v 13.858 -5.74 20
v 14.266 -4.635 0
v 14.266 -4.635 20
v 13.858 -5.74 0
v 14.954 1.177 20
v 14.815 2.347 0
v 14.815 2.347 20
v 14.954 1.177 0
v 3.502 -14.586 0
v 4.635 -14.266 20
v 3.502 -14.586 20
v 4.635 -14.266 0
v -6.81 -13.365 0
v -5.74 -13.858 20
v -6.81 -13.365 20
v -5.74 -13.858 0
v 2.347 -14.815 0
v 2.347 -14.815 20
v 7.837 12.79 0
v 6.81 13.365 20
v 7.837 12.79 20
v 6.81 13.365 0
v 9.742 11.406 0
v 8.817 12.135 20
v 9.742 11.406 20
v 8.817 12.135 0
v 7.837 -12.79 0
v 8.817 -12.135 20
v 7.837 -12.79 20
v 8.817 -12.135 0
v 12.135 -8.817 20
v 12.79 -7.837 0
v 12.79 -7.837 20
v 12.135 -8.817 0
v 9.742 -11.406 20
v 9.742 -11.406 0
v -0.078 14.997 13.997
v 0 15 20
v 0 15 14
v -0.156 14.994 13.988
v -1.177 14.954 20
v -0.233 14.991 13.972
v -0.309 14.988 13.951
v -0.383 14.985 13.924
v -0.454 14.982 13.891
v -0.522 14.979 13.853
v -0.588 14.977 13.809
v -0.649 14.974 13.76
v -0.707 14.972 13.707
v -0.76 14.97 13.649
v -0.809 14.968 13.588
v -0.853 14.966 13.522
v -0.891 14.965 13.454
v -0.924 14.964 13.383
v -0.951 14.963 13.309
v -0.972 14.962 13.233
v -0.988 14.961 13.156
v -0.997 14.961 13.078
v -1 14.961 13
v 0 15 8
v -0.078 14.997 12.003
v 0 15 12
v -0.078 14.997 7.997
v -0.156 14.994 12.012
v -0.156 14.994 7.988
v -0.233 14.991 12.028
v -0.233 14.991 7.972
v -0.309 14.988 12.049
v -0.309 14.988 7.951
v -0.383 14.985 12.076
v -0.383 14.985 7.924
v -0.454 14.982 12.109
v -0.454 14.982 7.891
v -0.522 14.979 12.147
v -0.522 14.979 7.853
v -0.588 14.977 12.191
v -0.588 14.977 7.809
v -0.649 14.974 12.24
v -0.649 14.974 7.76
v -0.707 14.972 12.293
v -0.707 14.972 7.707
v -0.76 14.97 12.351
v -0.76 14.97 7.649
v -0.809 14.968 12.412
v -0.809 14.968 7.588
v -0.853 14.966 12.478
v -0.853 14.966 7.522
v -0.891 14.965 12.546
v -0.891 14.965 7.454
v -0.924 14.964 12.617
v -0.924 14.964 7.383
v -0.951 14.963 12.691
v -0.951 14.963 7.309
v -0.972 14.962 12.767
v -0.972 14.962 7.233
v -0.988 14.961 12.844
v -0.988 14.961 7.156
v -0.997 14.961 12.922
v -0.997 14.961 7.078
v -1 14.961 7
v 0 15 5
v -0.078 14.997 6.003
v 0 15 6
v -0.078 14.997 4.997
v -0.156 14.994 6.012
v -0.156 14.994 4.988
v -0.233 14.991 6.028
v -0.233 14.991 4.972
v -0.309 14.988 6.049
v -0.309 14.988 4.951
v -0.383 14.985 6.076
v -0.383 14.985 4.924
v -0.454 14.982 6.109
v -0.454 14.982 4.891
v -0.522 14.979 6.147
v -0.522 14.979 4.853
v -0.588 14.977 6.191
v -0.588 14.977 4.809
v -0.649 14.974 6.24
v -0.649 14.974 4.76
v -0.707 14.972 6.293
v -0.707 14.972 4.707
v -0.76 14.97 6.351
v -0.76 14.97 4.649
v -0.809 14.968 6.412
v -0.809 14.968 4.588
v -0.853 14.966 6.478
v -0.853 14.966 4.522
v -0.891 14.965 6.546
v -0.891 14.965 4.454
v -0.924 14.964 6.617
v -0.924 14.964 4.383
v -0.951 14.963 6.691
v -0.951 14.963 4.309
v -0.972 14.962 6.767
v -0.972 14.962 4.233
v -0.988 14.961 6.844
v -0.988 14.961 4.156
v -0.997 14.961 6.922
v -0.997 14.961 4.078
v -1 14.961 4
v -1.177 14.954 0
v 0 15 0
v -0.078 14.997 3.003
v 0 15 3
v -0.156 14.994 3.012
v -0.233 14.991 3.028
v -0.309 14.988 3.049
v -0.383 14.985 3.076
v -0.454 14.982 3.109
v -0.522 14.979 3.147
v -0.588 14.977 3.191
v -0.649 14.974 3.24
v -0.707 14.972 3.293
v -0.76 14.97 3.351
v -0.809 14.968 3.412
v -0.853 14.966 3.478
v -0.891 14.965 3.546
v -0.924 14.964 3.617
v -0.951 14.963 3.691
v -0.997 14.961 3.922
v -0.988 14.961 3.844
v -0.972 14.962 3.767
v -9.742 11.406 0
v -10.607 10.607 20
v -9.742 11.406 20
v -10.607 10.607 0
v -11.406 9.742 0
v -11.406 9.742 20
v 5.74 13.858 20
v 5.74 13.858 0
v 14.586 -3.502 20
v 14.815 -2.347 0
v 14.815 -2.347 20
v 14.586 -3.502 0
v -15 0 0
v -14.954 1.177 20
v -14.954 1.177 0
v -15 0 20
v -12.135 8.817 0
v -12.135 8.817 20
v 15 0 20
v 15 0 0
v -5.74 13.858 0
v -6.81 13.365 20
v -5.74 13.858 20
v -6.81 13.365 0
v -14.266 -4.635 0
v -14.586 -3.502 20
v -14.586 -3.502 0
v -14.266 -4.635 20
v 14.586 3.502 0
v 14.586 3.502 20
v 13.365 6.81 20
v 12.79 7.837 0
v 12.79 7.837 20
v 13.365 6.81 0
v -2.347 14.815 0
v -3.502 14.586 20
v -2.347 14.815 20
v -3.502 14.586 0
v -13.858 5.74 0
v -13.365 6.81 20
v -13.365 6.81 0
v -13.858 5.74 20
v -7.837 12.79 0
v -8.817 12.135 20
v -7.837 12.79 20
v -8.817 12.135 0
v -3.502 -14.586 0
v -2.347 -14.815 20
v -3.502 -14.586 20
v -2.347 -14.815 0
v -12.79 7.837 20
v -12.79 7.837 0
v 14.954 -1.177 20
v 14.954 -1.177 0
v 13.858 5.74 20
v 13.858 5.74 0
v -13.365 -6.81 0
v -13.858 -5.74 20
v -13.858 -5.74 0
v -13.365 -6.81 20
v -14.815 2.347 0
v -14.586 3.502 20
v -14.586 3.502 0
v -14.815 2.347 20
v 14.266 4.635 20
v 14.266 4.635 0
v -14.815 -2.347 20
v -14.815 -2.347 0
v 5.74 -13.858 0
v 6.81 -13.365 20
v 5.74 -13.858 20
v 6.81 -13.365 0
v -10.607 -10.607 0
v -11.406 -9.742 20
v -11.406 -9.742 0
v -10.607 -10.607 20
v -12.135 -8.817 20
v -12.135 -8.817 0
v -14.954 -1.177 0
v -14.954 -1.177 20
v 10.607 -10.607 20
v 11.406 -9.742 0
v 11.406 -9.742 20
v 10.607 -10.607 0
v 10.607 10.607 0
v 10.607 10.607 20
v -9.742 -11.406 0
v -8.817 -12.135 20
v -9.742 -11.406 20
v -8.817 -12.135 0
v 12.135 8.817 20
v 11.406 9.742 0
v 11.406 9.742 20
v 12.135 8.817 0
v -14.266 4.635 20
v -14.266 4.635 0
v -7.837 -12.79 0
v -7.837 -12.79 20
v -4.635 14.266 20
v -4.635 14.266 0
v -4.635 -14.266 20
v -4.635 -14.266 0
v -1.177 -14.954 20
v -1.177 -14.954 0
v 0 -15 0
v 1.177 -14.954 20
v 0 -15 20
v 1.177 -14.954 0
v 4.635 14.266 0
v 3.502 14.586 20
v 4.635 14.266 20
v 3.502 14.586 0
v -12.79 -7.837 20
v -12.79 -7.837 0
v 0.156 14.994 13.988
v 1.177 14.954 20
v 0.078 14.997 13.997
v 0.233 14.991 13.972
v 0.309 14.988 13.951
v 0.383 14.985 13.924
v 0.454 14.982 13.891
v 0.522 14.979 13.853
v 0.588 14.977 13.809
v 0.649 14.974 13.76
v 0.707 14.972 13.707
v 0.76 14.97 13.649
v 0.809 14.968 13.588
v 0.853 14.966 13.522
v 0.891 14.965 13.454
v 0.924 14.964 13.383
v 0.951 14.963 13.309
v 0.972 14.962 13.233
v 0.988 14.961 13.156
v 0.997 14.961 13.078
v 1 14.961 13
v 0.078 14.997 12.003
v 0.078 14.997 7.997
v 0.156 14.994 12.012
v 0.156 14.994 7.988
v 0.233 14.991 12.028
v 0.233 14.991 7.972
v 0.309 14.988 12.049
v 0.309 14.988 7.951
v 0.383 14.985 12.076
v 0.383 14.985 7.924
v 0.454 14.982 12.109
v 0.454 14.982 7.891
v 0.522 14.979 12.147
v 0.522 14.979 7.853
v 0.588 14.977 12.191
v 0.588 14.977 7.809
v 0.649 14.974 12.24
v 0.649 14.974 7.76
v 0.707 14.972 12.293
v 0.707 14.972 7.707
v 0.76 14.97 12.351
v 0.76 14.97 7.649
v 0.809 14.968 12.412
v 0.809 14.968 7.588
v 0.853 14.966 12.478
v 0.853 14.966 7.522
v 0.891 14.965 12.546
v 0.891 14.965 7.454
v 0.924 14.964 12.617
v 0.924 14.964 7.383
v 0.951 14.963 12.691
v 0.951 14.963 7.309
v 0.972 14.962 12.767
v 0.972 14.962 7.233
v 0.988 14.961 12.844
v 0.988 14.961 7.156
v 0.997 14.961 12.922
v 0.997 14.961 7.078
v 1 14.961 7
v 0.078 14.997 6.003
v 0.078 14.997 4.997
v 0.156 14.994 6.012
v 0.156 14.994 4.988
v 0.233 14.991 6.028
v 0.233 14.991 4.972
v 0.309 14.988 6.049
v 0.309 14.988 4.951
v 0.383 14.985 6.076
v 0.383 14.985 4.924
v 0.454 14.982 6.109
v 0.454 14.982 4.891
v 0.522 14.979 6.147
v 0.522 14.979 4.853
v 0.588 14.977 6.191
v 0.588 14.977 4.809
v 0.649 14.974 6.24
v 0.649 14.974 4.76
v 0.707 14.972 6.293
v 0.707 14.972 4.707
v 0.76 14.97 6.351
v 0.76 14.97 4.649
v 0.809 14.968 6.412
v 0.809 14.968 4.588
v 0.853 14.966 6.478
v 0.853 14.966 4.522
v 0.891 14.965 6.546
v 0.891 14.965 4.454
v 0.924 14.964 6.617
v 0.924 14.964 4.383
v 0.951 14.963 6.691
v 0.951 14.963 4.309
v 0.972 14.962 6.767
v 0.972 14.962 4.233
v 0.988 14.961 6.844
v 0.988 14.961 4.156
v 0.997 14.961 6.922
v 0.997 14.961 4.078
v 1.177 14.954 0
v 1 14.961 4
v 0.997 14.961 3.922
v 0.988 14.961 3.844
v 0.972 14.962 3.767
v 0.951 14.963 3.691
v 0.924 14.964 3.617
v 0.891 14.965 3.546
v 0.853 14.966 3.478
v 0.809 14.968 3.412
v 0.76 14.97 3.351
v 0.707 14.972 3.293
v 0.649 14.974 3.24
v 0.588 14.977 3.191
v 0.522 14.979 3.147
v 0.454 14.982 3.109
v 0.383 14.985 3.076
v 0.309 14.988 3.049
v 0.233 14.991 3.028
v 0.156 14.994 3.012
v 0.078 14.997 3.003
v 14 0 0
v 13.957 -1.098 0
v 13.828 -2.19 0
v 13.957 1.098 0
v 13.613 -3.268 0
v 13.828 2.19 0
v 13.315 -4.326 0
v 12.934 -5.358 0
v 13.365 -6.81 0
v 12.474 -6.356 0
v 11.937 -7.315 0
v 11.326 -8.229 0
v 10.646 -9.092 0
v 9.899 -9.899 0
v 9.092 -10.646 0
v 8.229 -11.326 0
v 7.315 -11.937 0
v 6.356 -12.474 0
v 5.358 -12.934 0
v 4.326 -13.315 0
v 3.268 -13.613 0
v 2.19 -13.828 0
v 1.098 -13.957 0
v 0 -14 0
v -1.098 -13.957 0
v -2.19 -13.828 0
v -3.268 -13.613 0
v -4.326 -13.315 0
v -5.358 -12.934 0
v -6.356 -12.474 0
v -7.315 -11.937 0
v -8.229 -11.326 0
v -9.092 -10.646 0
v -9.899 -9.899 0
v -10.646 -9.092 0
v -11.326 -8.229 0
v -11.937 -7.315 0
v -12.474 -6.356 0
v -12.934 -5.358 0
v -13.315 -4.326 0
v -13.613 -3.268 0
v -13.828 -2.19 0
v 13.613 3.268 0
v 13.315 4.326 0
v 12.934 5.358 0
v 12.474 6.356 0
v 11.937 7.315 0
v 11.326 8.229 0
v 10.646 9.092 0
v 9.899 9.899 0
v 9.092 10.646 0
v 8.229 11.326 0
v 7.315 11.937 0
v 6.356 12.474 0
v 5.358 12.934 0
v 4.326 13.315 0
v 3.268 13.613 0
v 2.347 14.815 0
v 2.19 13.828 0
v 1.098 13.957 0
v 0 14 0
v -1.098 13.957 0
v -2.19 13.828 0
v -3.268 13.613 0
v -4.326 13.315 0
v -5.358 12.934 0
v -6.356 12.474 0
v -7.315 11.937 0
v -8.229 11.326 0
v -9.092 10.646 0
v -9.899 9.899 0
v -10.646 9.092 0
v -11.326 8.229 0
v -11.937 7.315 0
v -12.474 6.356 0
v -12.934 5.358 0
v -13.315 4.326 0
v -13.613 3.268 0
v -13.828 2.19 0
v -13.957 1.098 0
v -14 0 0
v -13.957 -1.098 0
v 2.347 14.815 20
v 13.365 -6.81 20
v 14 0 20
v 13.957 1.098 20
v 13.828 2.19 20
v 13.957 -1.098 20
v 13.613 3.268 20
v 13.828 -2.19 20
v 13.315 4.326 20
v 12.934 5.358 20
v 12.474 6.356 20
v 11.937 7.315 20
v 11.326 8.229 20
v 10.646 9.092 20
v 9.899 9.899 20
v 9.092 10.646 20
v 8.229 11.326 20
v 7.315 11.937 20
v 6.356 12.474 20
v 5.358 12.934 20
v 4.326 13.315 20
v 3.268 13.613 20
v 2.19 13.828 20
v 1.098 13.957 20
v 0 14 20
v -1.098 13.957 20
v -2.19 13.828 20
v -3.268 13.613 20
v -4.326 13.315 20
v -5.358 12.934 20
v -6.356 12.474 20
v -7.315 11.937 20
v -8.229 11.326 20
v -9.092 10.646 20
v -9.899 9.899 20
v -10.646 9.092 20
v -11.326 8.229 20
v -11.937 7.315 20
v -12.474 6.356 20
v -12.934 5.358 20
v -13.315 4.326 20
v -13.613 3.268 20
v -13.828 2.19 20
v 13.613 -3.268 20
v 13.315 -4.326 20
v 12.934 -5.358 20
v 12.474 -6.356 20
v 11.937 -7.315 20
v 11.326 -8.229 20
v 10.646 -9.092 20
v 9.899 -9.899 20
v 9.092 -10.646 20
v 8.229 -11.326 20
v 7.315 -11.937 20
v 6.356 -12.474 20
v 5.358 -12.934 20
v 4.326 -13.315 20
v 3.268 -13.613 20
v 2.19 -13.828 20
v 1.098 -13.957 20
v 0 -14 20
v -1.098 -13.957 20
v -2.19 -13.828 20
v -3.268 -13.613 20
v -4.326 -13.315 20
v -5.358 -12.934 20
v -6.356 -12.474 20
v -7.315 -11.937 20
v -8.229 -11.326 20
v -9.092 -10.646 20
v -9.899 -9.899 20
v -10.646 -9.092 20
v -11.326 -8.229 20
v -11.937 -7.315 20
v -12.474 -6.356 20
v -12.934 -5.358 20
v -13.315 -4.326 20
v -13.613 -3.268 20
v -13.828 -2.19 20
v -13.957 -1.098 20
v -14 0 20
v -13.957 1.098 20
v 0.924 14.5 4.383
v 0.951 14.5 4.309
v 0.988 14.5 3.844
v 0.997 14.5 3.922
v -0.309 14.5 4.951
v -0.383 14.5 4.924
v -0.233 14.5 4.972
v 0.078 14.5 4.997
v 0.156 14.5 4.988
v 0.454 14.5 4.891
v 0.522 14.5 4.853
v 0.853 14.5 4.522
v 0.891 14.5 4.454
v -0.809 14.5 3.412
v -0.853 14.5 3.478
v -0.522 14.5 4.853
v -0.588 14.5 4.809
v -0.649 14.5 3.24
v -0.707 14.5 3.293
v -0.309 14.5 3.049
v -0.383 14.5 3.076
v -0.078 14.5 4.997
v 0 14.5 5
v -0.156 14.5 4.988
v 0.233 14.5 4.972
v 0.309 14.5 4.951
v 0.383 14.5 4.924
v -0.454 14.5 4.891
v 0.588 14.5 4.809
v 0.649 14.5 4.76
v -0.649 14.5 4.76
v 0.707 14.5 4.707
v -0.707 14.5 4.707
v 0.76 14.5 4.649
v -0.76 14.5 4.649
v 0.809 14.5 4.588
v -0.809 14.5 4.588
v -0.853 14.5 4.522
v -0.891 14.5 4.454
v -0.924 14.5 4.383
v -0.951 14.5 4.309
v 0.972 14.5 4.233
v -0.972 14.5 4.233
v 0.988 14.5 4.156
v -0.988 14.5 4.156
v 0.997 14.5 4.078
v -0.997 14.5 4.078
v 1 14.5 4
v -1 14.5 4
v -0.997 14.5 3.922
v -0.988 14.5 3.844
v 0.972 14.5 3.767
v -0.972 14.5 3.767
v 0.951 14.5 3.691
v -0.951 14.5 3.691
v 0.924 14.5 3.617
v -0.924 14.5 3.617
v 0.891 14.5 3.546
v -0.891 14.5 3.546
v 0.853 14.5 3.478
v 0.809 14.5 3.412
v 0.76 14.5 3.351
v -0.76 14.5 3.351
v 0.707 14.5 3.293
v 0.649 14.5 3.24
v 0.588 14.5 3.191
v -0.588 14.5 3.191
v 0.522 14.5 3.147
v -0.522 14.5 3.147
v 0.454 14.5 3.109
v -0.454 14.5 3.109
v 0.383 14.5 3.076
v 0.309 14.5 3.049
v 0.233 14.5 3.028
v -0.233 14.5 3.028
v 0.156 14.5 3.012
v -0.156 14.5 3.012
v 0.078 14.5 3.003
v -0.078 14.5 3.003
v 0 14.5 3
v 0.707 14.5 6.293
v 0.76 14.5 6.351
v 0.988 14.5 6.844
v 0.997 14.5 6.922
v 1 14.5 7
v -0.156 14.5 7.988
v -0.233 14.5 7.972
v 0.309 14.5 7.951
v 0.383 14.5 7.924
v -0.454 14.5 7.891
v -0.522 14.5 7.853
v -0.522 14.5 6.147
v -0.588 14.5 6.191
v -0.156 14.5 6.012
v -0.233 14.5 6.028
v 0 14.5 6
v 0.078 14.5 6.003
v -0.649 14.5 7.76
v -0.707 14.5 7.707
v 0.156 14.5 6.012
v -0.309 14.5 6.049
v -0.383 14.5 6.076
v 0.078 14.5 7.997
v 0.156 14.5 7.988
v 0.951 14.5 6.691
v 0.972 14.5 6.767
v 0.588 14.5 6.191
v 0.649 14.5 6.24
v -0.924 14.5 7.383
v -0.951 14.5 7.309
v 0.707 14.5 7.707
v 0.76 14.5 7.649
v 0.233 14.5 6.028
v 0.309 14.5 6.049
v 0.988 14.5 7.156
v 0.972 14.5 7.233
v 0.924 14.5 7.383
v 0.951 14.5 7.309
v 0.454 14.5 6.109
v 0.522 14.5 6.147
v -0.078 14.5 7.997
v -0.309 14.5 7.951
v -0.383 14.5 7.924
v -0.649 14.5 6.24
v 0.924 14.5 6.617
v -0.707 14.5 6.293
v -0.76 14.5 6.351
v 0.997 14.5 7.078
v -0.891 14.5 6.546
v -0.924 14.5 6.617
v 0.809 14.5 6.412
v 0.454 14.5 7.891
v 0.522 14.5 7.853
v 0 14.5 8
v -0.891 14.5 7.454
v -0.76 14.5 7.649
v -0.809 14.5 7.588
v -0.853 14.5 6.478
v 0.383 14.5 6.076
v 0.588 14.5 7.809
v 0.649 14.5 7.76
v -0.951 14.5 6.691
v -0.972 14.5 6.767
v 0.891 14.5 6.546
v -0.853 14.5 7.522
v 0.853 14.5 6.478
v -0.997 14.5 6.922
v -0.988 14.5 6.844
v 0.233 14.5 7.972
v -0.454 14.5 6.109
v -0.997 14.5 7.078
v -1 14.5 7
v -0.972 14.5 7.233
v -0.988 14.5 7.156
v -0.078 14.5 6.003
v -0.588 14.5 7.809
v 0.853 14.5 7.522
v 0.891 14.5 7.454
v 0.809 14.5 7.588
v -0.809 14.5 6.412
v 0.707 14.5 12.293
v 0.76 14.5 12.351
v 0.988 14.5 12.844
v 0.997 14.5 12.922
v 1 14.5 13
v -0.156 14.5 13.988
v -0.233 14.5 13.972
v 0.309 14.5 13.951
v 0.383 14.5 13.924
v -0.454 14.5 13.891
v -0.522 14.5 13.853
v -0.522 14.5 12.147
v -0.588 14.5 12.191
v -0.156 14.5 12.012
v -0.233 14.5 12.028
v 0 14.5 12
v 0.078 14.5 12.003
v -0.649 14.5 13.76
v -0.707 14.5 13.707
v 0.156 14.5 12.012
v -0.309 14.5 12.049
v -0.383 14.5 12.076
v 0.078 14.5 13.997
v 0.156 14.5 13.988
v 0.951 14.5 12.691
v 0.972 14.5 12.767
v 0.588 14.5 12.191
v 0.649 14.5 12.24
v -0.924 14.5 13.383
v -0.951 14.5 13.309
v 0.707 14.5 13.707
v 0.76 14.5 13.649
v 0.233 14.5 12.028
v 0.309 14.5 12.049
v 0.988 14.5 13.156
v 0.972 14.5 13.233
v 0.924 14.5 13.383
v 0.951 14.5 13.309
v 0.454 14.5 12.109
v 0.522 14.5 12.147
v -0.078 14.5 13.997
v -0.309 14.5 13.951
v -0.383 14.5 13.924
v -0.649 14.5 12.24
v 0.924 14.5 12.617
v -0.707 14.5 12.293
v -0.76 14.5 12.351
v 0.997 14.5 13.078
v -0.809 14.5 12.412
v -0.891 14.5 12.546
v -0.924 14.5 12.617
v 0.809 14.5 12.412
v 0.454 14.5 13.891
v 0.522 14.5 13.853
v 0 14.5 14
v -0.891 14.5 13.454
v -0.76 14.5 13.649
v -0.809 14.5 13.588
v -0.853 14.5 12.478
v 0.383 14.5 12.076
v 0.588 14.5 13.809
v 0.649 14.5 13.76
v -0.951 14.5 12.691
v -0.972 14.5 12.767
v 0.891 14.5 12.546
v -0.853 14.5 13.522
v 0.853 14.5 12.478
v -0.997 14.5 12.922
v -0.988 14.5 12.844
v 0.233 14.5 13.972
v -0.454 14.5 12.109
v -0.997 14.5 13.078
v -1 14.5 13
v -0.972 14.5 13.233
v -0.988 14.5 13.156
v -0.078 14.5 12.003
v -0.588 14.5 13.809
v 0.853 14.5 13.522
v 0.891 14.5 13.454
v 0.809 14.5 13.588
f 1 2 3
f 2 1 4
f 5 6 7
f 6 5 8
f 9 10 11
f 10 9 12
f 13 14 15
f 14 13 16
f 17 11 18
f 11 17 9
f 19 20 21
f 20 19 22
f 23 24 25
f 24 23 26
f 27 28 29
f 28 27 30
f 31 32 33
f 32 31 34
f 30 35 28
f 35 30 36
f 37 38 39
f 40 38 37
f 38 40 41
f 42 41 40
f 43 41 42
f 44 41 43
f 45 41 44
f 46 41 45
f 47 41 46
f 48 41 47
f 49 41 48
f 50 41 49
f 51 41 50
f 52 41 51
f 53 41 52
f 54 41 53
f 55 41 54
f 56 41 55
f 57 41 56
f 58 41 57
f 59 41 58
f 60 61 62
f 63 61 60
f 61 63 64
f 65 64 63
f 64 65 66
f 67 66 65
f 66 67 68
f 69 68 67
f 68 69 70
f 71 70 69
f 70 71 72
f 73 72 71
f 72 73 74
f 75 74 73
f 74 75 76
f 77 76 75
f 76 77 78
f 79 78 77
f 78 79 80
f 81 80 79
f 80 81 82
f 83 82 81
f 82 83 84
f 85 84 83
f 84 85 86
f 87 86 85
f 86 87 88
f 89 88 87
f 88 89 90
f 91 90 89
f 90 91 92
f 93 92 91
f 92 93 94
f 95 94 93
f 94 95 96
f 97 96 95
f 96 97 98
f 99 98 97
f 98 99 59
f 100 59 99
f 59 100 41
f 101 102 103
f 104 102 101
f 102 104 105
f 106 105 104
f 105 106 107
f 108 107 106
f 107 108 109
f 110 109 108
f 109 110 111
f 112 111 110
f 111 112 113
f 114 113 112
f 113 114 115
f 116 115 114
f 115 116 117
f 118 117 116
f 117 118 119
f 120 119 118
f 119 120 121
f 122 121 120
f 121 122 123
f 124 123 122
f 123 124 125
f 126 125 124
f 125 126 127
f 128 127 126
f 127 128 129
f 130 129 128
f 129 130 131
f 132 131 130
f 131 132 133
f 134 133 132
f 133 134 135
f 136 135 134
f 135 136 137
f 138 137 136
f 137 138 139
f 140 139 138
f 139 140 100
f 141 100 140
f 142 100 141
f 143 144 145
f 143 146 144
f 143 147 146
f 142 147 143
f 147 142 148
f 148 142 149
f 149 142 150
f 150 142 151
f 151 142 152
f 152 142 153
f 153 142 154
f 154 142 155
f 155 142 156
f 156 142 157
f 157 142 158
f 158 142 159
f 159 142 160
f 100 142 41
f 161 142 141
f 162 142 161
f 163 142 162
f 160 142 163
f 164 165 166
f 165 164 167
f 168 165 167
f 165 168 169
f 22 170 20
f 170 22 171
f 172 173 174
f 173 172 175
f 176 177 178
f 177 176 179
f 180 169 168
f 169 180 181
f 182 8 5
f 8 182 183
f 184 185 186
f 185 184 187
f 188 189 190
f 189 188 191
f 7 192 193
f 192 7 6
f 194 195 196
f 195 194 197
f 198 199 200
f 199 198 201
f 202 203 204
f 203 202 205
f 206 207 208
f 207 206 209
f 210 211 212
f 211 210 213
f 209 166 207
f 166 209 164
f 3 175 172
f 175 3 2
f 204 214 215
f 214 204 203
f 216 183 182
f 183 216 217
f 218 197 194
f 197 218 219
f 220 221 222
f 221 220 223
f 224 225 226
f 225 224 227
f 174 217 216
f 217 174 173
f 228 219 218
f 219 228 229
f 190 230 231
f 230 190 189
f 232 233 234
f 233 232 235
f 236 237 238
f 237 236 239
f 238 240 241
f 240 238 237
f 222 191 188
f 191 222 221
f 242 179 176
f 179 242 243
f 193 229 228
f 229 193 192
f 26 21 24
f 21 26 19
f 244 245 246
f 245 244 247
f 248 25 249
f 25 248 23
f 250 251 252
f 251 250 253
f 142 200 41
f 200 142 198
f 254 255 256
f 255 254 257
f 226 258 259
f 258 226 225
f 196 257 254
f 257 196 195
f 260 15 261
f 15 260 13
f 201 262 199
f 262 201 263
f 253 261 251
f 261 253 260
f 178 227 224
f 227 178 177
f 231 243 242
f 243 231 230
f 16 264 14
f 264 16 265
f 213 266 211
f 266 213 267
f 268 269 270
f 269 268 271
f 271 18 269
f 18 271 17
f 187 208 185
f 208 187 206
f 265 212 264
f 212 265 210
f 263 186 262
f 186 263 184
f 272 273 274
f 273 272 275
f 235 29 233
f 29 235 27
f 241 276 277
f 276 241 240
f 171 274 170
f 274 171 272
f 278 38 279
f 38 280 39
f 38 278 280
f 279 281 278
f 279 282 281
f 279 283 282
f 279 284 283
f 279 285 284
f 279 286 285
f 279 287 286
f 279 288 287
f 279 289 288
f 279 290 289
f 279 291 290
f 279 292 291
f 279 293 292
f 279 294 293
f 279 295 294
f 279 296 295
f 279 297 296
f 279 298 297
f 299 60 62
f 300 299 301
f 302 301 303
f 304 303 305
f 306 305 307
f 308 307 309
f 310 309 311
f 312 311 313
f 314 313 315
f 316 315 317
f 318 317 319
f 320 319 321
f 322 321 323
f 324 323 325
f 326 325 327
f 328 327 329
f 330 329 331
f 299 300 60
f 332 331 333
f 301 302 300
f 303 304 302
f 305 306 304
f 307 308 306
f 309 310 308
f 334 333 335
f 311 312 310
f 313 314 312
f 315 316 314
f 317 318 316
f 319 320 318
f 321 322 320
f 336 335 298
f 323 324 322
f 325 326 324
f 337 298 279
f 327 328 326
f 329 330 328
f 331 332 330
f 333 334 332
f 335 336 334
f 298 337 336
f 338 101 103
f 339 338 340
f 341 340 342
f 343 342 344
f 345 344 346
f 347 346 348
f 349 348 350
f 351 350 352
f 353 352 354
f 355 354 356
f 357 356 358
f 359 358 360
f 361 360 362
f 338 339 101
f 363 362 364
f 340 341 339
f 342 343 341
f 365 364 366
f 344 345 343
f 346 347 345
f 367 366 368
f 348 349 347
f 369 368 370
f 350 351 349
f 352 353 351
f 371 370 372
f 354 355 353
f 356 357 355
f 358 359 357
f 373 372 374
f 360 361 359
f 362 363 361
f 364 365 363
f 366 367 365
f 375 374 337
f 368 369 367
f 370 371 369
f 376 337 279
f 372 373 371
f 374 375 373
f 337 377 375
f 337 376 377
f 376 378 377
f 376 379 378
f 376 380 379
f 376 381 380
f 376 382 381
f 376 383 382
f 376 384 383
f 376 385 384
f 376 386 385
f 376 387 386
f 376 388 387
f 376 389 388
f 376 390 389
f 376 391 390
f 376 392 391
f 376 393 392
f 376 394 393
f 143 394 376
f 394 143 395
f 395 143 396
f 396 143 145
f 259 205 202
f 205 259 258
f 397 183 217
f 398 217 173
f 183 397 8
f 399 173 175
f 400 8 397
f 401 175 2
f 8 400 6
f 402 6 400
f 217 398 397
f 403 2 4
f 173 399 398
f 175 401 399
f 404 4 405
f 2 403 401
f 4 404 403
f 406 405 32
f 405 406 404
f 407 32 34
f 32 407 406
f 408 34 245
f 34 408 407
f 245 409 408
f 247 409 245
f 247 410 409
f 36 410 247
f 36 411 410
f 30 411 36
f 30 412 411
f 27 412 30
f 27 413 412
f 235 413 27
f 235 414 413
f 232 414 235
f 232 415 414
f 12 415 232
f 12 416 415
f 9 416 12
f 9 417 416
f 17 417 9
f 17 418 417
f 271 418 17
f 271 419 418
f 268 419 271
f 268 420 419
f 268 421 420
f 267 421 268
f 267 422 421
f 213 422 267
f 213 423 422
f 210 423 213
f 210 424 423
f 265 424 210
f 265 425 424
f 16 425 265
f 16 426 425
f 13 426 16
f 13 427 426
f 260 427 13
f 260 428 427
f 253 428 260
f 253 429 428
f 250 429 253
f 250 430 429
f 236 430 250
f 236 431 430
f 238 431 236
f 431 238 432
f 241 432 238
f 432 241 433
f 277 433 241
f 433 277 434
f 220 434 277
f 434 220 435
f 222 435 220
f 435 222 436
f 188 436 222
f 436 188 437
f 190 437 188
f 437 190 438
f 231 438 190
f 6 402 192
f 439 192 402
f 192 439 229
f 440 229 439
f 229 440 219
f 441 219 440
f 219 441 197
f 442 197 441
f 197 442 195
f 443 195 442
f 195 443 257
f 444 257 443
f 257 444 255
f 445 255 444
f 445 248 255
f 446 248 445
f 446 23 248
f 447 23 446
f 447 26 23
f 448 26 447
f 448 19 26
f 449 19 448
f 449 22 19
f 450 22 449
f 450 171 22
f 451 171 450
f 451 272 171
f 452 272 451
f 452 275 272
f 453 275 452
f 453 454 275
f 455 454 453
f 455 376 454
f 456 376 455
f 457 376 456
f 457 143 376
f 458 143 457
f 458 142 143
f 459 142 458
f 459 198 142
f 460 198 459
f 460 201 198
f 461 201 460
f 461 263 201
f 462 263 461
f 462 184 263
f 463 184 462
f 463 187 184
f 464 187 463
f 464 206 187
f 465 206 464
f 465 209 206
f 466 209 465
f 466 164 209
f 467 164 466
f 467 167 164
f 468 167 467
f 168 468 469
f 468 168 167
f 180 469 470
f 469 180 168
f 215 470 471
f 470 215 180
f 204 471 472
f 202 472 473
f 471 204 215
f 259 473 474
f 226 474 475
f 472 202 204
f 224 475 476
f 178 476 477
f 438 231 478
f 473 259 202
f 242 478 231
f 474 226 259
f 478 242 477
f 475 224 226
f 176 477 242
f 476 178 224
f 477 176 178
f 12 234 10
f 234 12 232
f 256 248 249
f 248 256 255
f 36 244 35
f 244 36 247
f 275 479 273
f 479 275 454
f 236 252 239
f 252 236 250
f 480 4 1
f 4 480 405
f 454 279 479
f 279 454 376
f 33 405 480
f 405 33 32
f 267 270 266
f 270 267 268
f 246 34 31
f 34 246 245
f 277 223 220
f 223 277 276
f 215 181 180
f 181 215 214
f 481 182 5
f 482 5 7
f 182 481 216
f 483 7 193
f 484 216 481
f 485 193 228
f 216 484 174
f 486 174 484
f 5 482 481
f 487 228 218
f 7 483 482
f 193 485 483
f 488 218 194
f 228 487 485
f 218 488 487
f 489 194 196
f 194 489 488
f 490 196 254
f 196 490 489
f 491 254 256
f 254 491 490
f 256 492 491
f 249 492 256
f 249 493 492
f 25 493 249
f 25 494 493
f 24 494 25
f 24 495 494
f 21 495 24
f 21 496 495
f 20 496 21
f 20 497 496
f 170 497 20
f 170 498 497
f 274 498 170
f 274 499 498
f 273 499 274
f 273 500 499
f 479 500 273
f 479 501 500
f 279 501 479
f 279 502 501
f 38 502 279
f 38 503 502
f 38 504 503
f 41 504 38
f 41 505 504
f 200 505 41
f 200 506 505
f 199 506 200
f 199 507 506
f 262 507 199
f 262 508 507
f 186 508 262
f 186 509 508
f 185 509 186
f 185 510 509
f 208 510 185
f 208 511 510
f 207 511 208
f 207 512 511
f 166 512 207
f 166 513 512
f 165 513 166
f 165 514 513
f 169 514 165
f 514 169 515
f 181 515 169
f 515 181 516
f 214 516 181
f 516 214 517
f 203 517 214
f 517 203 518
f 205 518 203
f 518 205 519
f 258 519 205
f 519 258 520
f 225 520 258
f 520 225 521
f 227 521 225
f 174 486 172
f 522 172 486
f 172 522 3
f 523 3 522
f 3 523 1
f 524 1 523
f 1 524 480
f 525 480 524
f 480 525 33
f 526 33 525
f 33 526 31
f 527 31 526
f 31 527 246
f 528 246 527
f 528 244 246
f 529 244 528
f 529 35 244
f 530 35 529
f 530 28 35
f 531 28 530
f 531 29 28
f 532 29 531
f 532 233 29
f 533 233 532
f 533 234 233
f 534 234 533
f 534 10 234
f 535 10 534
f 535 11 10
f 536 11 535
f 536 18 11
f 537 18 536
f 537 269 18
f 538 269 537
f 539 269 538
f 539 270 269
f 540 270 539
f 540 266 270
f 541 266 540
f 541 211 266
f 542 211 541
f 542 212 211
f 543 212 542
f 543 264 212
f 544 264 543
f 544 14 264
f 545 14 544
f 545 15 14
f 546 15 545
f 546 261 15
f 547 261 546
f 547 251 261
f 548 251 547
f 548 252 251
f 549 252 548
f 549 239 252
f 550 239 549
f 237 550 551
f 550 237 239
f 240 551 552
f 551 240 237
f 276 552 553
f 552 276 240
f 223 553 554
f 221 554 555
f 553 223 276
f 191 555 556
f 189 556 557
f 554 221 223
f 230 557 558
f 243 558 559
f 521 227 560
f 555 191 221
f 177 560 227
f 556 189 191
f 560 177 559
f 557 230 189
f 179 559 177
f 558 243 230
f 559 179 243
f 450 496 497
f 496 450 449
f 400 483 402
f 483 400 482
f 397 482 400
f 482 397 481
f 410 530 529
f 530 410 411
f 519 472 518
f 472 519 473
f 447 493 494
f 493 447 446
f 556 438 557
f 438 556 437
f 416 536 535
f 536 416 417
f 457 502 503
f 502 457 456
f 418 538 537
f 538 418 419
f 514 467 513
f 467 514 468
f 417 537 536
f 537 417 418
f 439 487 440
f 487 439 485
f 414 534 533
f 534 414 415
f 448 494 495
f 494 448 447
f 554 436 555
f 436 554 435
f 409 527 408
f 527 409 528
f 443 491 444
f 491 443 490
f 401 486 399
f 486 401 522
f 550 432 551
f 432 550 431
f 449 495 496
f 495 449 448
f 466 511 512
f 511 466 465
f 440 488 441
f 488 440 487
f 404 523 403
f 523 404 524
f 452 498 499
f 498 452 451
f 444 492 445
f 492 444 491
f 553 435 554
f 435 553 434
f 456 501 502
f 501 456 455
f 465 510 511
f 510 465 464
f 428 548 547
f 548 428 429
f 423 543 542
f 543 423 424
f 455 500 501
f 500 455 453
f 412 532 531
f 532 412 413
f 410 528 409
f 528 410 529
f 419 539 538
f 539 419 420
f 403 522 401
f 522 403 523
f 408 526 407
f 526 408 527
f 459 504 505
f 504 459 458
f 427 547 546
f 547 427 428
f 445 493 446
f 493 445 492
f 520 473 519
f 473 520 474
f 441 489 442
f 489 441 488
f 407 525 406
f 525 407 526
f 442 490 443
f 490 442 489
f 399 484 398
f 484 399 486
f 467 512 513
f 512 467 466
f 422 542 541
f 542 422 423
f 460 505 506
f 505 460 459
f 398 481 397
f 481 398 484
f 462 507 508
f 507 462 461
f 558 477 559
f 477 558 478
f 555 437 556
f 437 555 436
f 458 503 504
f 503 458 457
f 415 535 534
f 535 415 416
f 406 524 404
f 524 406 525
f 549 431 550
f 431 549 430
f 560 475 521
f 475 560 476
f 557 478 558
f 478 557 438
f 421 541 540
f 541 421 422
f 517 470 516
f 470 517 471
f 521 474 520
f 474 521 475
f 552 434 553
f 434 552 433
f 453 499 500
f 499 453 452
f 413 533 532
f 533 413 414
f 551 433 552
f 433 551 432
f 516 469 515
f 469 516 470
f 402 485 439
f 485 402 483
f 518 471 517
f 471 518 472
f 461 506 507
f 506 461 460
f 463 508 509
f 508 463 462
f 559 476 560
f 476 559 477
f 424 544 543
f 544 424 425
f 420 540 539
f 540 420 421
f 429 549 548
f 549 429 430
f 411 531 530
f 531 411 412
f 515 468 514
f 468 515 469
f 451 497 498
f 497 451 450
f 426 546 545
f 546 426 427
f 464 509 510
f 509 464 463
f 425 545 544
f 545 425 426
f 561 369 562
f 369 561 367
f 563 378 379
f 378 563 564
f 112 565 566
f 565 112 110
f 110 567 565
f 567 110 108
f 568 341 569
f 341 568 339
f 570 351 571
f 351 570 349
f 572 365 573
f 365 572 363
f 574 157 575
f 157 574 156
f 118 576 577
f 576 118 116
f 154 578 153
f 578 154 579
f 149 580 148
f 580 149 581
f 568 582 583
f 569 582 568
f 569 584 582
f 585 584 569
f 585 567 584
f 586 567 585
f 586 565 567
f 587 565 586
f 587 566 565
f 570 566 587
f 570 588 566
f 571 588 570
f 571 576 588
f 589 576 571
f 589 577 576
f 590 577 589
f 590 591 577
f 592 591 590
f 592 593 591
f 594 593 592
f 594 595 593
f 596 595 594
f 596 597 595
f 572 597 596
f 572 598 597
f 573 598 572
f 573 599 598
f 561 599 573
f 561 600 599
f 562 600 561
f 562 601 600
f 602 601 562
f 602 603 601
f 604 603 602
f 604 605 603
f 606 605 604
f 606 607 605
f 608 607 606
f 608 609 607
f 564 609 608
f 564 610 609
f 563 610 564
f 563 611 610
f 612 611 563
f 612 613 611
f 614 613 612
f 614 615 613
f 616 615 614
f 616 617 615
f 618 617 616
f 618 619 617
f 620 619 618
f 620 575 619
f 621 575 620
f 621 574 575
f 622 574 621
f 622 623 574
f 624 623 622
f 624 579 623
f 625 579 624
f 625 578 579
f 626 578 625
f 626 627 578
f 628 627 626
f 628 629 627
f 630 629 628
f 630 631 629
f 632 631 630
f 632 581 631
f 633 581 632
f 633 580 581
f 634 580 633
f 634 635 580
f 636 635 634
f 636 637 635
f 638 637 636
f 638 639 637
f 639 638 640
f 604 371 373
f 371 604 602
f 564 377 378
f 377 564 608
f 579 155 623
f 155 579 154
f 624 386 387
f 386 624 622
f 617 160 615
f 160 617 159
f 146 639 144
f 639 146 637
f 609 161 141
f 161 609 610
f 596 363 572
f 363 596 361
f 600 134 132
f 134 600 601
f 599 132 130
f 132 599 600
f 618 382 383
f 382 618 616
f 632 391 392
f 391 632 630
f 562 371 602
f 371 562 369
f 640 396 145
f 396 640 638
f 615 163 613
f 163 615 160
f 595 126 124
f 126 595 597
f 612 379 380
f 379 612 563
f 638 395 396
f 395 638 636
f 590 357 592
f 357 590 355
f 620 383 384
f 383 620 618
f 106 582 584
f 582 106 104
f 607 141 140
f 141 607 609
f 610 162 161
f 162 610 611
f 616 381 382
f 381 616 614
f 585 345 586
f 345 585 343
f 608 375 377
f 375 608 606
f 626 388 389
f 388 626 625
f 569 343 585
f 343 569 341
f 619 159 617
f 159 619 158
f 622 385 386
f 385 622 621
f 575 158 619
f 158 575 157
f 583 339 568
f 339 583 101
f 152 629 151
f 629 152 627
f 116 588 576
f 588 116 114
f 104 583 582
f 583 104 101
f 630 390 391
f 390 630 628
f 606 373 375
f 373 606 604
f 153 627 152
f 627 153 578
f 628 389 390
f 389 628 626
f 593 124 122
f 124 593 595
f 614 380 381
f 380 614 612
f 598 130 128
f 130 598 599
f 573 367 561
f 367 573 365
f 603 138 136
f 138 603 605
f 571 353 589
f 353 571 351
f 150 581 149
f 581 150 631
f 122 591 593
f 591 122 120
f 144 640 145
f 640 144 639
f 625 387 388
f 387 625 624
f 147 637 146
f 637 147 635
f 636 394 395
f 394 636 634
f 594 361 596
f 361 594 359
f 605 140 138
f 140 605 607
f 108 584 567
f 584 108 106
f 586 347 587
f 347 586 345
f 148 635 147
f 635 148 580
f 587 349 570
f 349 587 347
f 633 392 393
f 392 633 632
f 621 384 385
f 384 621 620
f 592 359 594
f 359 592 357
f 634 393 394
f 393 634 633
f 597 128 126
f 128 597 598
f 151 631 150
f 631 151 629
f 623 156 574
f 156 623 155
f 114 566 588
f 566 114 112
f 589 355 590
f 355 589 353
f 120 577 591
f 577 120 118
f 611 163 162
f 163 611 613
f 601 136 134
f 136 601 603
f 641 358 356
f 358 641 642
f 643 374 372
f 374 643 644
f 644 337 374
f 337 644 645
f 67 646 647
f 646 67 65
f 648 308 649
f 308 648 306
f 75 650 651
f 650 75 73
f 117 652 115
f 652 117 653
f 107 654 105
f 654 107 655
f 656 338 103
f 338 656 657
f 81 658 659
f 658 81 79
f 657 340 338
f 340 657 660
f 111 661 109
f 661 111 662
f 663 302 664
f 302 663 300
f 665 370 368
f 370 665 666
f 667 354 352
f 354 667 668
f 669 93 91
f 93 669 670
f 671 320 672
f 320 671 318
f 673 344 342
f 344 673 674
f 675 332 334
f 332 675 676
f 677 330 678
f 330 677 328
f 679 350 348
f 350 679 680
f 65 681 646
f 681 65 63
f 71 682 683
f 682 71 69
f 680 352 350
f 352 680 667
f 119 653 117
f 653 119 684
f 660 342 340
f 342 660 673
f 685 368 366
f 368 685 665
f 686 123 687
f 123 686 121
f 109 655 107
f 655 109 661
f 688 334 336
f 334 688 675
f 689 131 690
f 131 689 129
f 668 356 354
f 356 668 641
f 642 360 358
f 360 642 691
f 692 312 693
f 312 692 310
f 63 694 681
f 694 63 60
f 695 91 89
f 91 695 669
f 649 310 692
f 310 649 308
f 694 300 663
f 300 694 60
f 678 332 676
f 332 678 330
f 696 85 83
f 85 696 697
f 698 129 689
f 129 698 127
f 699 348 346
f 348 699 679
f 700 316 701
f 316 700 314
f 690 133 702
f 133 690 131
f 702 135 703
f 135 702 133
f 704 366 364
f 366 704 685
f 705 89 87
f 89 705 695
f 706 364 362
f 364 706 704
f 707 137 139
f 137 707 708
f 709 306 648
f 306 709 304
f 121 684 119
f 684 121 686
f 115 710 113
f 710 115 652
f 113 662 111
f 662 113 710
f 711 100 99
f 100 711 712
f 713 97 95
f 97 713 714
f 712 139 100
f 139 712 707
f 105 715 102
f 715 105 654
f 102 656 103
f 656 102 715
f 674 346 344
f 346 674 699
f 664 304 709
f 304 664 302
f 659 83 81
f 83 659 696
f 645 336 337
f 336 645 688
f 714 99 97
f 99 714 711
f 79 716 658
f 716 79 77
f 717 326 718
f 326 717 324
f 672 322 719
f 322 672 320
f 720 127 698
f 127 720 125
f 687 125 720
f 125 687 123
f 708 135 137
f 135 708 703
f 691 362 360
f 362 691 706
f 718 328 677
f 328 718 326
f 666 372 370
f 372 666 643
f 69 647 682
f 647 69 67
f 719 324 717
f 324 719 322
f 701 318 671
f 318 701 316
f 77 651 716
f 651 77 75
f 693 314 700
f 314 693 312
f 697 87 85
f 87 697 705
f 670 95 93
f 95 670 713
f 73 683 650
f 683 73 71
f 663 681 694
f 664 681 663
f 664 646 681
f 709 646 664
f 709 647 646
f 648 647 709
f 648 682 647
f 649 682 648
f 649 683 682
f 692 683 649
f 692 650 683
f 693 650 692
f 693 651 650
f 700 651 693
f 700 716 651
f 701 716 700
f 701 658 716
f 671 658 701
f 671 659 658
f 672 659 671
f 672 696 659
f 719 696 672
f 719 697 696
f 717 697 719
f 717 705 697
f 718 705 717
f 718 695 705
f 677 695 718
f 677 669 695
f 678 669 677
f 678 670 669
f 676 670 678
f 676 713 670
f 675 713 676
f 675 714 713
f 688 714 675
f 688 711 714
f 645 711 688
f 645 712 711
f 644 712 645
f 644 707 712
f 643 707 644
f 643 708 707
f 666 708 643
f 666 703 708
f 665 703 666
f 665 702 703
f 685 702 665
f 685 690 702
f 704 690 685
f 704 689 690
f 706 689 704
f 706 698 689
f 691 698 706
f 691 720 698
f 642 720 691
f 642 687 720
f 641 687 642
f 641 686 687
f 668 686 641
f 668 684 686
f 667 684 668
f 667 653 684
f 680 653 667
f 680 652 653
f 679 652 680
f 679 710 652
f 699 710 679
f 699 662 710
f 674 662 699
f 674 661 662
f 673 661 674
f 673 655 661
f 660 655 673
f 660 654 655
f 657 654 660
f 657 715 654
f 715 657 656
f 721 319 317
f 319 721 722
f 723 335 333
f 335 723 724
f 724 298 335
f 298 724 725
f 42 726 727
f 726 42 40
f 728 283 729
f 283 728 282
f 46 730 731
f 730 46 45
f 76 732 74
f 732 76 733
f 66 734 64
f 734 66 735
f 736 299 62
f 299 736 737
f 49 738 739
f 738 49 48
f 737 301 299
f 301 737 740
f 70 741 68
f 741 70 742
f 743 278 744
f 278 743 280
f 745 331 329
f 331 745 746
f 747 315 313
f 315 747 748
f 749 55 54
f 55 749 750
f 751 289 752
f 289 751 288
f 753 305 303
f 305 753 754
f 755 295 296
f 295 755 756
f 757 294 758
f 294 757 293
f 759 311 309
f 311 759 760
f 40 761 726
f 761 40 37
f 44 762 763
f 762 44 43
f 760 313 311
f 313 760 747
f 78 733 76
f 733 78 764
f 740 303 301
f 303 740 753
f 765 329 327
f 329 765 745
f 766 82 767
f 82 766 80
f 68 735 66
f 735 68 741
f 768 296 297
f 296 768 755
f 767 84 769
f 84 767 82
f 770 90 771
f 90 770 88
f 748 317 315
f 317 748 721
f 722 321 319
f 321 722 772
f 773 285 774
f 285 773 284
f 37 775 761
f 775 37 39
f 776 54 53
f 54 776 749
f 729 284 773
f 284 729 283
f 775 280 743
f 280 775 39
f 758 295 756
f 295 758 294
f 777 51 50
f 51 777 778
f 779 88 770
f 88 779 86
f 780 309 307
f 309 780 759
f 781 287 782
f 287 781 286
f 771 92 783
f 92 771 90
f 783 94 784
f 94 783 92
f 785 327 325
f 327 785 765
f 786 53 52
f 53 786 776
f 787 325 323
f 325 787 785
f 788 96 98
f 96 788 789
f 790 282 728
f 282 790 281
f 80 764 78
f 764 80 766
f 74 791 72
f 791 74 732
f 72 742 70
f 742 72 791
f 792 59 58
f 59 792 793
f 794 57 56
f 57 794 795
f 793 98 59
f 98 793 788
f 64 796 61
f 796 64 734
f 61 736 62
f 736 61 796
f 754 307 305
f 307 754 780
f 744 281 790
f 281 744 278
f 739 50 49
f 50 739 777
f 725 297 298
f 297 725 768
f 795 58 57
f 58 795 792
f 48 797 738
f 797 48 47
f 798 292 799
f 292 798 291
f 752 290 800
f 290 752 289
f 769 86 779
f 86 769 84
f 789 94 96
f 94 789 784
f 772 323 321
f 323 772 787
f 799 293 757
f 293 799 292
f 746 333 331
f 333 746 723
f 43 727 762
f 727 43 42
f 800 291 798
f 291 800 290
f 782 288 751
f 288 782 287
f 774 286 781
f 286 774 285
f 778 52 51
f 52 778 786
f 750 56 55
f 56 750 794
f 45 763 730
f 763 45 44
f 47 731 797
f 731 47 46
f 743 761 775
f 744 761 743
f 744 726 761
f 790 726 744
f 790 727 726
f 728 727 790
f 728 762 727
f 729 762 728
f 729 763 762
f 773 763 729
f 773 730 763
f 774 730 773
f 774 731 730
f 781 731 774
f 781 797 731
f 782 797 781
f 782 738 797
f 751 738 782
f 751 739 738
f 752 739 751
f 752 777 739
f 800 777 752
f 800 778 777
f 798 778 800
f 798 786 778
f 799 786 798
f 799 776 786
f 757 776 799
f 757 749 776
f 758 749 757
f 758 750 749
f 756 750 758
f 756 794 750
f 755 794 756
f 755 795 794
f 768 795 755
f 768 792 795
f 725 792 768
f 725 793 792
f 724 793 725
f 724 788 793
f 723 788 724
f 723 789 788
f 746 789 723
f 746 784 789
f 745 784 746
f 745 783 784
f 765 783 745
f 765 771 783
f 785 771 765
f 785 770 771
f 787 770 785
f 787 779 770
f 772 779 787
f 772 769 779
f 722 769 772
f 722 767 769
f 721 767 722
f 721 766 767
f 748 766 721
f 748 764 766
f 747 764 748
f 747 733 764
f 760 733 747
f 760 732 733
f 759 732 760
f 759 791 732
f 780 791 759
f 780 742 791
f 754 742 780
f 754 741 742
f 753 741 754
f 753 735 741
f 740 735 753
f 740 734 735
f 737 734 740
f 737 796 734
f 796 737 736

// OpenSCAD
// file: ../shapes.scad
FACES   = 180;
EPSILON = 0.1;
PIN	    = 2.54;


module tube(h=1, inner=0, outer=0, di=0, do=0) {
    rInner = inner > 0 ? inner : di / 2;
    rOuter = outer > 0 ? outer : do / 2;

	if (rInner >= rOuter) echo("ERROR in tube. rOuter must be > rInner.");

	difference() {
		cylinder(h=h, r=rOuter);
		translate([0,0,-EPSILON]) {
			cylinder(h=h + EPSILON*2, r=rInner);
		}
	}
}

module roundedRect(size, r, up="z")
{
	if (up == "x") {
		H = size[0];
		hull()
		{
			translate([0, r, r]) rotate([0, 90, 0]) cylinder(r=r, h=H);
			translate([0, size[1] - r, r]) rotate([0, 90, 0]) cylinder(r=r, h=H);
			translate([0, r, size[2] - r]) rotate([0, 90, 0]) cylinder(r=r, h=H);
			translate([0, size[1] - r, size[2] - r]) rotate([0, 90, 0]) cylinder(r=r, h=H);
		}
	}
	else if (up == "y") {
		H = size[1];
		hull()
		{
			translate([r, 0, r]) rotate([-90, 0, 0]) cylinder(r=r, h=H);
			translate([size[0] - r, 0, r]) rotate([-90, 0, 0]) cylinder(r=r, h=H);
			translate([r, 0, size[2] - r]) rotate([-90, 0, 0]) cylinder(r=r, h=H);
			translate([size[0] - r, 0, size[2] - r]) rotate([-90, 0, 0]) cylinder(r=r, h=H);
		}
	}
	else {
		H = size[2];
		hull()
		{
			translate([r, r, 0])  cylinder(r=r, h=H);
			translate([size[0] - r, r, 0])  cylinder(r=r, h=H);
			translate([r, size[1] - r, 0])  cylinder(r=r, h=H);
			translate([size[0] - r, size[1] - r, 0])  cylinder(r=r, h=H);
		}
	}
}

module cubePair(x, size)
{
	translate([x, 0, 0])
		cube(size=size);
	mirror([1,0,0]) translate([x, 0, 0])
		cube(size=size);
}

module polygonXY(h, points)
{
    linear_extrude(height = h) {
        polygon(points=points);
    }  
}

module polygonYZ(h, points)
{
    multmatrix(m = [ [0, 0, 1, 0],
    				 [1, 0, 0, 0],
    				 [0, 1, 0, 0],
    				 [0, 0, 0, 1]
       			   ])
    linear_extrude(height = h) {
        polygon(points=points);
    }  	
}

module polygonXZ(h, points)
{
    multmatrix(m = [ [1, 0, 0, 0],
    				 [0, 0, 1, 0],
    				 [0, 1, 0, 0],
    				 [0, 0, 0, 1]
       			   ])
    linear_extrude(height = h) {
        polygon(points=points);
    }  	
}


module zCapsule(dz0, dz1, r, roundedRect=0)
{
	if (roundedRect == 0) {
		hull() {
			translate([0, 0, dz0]) rotate([-90, 0, 0]) cylinder(h=50, r=r);
			translate([0, 0, dz1]) rotate([-90, 0, 0]) cylinder(h=50, r=r);
		}
	}
	else {
		if (dz1 < dz0) {
			t = dz0;
			dz0 = dz1;
			dz1 = t;
		}
		hull() {
			translate([r - roundedRect, 0, dz0 - r + roundedRect]) 
				rotate([-90, 0, 0]) cylinder(h=50, r=roundedRect);
			translate([-r + roundedRect, 0, dz0 - r + roundedRect]) 
				rotate([-90, 0, 0]) cylinder(h=50, r=roundedRect);
			translate([r - roundedRect, 0, dz1 + r - roundedRect]) 
				rotate([-90, 0, 0]) cylinder(h=50, r=roundedRect);
			translate([-r + roundedRect, 0, dz1 + r - roundedRect]) 
				rotate([-90, 0, 0]) cylinder(h=50, r=roundedRect);
		}
	}
}


module xRoofCube(size)
{
	x = size[0];
	y = size[1];
	z = size[2];

	polygonXY(h=z, points=[
		[0, 0],
		[x, 0],
		[x, y + x],		// gets the 45 degree angle for printing
		[0, y]
	]);
}
// main file
use <../shapes.scad>

$fn = 80;

difference() {
    tube(h=20, do=30, di=28);

    /*
    for(i=[0:3]) {
        Y = (i==2) ? 30/2 - 0.5 : 30/2 - 1.0;
        translate([0, Y, 4 + 4.0 * i]) rotate([-90, 0, 0]) cylinder(h=10, d=2);
    }
    */
    for(i=[0:3]) {
        if (i != 2)
            translate([0, 30/2 - 0.5, 4 + 3.0 * i]) 
                rotate([-90, 0, 0]) 
                    cylinder(h=10, d=2);
    }
}
